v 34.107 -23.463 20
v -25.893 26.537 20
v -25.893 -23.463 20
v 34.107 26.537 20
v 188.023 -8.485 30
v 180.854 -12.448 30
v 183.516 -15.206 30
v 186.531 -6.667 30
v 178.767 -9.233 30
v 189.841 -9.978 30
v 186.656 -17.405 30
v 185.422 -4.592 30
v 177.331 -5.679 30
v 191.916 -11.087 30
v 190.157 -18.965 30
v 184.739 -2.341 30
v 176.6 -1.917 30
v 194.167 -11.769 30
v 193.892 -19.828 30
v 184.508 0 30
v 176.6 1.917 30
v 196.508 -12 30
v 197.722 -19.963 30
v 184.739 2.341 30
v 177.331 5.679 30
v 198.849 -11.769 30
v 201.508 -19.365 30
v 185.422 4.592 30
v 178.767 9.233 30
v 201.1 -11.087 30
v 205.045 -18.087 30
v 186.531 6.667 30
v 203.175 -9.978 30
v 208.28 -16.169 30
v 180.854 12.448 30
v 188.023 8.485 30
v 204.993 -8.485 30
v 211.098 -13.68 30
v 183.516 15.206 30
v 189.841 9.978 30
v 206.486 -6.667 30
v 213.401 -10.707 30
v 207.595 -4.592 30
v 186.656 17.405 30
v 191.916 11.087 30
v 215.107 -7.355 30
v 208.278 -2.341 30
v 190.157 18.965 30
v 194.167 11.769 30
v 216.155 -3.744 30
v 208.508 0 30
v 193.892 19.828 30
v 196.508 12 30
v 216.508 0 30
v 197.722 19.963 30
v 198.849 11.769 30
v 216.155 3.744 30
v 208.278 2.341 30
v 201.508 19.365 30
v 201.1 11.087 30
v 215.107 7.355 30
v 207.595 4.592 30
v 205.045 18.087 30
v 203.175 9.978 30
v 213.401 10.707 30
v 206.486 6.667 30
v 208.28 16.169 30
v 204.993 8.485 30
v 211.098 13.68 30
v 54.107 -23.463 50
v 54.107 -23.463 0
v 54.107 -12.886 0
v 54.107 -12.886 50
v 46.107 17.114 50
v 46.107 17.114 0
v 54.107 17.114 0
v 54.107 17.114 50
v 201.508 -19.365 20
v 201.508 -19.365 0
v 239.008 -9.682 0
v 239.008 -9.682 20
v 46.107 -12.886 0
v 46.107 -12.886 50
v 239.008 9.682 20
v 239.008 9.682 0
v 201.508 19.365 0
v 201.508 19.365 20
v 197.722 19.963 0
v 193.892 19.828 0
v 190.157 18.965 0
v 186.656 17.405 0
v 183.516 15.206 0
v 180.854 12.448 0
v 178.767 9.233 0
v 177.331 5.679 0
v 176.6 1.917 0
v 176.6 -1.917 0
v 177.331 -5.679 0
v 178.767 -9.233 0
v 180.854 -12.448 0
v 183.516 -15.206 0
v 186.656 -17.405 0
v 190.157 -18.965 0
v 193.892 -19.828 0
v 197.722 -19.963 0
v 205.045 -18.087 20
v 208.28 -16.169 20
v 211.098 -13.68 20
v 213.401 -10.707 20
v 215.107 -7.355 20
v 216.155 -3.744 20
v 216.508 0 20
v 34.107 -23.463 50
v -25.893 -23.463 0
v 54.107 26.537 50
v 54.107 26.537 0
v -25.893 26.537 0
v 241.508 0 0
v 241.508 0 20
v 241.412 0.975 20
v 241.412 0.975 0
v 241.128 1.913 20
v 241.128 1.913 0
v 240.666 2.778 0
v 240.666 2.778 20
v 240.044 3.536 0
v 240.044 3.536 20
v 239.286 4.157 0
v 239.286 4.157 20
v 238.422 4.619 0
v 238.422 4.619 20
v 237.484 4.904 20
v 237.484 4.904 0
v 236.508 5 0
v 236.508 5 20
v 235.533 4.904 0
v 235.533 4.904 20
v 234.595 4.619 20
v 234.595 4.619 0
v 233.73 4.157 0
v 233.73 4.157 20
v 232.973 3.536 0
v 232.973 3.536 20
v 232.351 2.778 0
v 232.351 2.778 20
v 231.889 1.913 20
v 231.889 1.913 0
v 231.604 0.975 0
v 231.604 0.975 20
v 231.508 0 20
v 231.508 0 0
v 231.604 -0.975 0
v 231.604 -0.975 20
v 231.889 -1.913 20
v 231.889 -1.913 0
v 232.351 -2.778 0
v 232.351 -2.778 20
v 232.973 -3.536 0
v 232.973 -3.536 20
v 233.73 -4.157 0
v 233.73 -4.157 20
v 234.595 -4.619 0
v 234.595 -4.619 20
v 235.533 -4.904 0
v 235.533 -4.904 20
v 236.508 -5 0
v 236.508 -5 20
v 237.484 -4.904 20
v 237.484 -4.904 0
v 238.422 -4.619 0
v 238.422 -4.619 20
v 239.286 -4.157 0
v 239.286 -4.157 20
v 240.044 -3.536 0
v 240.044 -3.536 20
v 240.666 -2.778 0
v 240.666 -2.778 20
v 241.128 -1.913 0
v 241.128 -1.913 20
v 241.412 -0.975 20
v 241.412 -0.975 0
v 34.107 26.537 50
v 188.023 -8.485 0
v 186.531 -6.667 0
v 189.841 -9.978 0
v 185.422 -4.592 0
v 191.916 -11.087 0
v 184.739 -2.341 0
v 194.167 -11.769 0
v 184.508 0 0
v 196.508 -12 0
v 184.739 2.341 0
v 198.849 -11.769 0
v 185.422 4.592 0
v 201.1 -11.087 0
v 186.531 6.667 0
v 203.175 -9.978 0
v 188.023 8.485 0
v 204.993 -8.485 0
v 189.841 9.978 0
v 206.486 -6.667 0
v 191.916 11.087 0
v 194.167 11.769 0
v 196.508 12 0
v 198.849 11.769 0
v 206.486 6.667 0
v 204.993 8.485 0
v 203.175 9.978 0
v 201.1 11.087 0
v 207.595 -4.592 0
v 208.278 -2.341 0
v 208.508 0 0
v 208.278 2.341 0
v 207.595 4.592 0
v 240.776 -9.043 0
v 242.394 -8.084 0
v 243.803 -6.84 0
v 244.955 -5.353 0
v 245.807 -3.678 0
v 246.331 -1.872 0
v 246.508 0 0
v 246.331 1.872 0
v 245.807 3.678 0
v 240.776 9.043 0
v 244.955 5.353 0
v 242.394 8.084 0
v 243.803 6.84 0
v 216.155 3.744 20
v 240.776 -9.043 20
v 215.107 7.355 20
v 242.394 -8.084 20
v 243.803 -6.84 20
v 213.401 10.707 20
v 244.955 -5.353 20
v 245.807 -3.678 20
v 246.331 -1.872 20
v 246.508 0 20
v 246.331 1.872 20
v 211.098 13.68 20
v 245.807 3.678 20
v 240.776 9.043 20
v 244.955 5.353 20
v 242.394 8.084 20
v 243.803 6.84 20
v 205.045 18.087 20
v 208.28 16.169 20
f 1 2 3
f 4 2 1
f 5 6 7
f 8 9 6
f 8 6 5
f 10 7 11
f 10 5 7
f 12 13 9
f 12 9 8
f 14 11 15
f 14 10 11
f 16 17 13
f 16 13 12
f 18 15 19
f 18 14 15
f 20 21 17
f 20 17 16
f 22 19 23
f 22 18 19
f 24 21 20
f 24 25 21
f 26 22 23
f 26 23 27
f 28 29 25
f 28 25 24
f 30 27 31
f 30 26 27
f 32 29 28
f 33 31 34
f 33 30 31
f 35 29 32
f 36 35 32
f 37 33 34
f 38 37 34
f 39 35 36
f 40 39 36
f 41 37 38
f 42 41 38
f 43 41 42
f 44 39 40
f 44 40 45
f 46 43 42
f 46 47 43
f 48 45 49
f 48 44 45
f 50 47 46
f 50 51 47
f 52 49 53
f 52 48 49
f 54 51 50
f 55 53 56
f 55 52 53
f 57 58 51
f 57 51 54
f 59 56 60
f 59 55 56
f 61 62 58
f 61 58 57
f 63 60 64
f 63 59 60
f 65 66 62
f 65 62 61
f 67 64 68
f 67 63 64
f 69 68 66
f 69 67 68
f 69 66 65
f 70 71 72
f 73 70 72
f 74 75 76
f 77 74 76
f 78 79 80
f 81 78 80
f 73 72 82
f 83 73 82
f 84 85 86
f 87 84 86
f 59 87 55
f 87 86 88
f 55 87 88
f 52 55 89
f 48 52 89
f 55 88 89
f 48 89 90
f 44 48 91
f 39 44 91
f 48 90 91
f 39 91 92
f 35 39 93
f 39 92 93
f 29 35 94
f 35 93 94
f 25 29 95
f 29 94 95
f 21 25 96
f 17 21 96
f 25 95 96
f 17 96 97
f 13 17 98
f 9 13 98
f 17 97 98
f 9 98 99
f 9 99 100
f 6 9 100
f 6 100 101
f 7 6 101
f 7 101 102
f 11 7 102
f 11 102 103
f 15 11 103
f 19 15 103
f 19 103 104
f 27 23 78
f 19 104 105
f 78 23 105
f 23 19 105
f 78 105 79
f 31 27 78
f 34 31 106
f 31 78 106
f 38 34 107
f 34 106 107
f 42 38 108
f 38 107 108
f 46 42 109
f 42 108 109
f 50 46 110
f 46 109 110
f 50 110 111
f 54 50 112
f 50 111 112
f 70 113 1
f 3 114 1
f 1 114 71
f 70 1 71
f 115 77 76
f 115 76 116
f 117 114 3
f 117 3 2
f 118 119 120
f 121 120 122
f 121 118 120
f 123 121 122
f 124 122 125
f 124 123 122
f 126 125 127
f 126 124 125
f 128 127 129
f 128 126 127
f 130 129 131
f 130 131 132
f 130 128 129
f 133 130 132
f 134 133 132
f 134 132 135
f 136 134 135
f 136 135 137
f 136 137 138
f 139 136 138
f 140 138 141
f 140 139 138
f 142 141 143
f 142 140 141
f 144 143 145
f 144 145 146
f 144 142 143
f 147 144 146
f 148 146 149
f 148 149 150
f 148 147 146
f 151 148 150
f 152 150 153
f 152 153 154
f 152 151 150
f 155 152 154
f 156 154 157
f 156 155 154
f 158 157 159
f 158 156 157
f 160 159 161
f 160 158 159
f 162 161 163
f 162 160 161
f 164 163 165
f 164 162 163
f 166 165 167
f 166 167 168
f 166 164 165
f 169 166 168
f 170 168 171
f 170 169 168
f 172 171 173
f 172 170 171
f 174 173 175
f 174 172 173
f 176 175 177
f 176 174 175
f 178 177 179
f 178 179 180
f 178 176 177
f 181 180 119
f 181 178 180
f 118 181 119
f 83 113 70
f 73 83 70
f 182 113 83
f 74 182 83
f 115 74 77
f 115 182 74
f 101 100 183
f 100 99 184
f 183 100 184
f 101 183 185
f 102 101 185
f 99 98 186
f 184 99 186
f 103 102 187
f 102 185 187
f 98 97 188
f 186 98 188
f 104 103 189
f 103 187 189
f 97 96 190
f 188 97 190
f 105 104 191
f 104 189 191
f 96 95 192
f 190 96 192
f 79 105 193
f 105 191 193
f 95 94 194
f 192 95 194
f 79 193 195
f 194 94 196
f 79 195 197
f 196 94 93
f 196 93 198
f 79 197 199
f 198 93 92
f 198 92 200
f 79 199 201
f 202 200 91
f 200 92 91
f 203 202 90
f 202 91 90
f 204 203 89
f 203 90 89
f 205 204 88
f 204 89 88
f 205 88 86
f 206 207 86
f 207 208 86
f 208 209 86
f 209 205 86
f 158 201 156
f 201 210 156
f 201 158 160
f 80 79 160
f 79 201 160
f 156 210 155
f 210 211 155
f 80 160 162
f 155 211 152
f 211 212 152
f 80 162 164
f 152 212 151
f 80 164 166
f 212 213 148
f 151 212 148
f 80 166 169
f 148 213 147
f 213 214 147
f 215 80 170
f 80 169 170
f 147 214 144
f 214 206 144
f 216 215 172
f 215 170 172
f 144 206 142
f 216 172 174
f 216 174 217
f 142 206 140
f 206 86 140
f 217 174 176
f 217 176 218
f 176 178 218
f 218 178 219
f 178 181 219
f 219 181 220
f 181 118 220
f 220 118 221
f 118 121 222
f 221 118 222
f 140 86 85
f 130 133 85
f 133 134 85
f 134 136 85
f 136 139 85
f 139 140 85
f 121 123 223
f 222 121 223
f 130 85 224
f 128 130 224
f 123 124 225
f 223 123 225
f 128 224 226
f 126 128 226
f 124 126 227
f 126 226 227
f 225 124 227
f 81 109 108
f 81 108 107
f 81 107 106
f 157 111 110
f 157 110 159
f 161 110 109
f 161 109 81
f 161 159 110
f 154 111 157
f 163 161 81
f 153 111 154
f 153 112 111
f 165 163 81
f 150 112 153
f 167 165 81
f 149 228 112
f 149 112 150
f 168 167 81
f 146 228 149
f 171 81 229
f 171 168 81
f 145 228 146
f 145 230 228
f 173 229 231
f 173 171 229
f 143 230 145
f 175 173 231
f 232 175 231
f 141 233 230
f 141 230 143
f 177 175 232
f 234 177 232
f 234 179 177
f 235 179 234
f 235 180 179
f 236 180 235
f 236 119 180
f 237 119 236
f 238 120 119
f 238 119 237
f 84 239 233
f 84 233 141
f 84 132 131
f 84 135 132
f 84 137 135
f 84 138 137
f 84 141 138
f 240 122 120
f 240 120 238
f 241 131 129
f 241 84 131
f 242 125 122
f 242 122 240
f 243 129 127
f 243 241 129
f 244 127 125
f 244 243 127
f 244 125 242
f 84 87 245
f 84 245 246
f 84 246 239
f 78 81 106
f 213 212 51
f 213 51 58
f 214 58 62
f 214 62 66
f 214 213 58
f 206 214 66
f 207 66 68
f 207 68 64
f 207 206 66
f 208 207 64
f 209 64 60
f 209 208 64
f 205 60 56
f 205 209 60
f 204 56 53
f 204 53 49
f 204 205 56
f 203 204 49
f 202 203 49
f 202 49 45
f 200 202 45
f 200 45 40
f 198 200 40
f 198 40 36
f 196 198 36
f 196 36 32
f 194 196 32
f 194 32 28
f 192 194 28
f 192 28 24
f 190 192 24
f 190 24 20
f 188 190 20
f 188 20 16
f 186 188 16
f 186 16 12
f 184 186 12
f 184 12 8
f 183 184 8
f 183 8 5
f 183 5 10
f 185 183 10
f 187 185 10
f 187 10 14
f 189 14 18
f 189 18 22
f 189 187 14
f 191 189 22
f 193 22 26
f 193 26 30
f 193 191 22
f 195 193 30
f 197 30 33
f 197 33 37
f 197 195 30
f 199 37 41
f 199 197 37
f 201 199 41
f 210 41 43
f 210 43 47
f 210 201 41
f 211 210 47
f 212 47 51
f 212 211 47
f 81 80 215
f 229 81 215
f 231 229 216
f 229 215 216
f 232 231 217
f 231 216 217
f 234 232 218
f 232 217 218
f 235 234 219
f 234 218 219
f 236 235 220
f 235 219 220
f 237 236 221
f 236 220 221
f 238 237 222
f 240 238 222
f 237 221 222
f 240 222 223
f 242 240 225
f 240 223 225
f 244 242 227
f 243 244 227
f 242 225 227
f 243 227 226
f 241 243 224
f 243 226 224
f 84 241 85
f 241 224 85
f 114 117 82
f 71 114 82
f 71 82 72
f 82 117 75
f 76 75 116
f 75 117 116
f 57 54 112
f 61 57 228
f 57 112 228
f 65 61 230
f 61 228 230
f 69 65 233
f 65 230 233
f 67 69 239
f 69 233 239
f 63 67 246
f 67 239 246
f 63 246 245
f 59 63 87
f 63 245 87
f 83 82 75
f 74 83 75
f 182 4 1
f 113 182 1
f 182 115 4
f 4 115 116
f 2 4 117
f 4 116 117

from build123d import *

# Parameters (mm, degrees)
F0_W     = 60
F0_H     = 50
F1_DEPTH = 20
F2_DEPTH = 50
F3_R     = 12
F4_DEPTH = 30
F3_R_2   = 5
F5_DEPTH = 20


with BuildPart() as f1:
    # F0 (on Top) → F1 (new body)
    with BuildSketch(Plane.XY):
        with Locations((4.106674, 1.537061)):
            Rectangle(F0_W, F0_H)
    extrude(amount=F1_DEPTH)

    # F0 (on Top) → F2 (join)
    with BuildSketch(Plane.XY):
        Polygon((54.106674, 26.537061), (34.106674, 26.537061), (34.106674, -23.462939), (54.106674, -23.462939), (54.106674, -12.886015), (46.106674, -12.886015), (46.106674, 17.113985), (54.106674, 17.113985), align=None)
    extrude(amount=F2_DEPTH)


with BuildPart() as f4:
    # F3 (on Top) → F4 (new body)
    with BuildSketch(Plane.XY):
        with BuildLine():
            ThreePointArc((201.508188, -19.364917), (212.319576, -12.247449), (216.508188, 0))
            ThreePointArc((216.508188, 0), (212.319576, 12.247449), (201.508188, 19.364917))
            ThreePointArc((201.508188, 19.364917), (176.508188, 0), (201.508188, -19.364917))
        make_face()
        with Locations((196.508188, 0)):
            Circle(F3_R, mode=Mode.SUBTRACT)
    extrude(amount=F4_DEPTH)

    # F3 (on Top) → F5 (join)
    with BuildSketch(Plane.XY):
        with BuildLine():
            ThreePointArc((201.508188, -19.364917), (212.319576, -12.247449), (216.508188, 0))
            ThreePointArc((216.508188, 0), (212.319576, 12.247449), (201.508188, 19.364917))
            ThreePointArc((201.508188, 19.364917), (176.508188, 0), (201.508188, -19.364917))
        make_face()
        with Locations((196.508188, 0)):
            Circle(F3_R, mode=Mode.SUBTRACT)
        with BuildLine():
            ThreePointArc((201.508188, 19.364917), (212.319576, 12.247449), (216.508188, 0))
            ThreePointArc((216.508188, 0), (212.319576, -12.247449), (201.508188, -19.364917))
            Line((201.508188, -19.364917), (239.008188, -9.682458))
            ThreePointArc((239.008188, -9.682458), (246.508188, 0), (239.008188, 9.682458))
            Line((239.008188, 9.682458), (201.508188, 19.364917))
        make_face()
        with Locations((236.508188, 0)):
            Circle(F3_R_2, mode=Mode.SUBTRACT)
    extrude(amount=F5_DEPTH)


solid = Compound([f1.part, f4.part])
